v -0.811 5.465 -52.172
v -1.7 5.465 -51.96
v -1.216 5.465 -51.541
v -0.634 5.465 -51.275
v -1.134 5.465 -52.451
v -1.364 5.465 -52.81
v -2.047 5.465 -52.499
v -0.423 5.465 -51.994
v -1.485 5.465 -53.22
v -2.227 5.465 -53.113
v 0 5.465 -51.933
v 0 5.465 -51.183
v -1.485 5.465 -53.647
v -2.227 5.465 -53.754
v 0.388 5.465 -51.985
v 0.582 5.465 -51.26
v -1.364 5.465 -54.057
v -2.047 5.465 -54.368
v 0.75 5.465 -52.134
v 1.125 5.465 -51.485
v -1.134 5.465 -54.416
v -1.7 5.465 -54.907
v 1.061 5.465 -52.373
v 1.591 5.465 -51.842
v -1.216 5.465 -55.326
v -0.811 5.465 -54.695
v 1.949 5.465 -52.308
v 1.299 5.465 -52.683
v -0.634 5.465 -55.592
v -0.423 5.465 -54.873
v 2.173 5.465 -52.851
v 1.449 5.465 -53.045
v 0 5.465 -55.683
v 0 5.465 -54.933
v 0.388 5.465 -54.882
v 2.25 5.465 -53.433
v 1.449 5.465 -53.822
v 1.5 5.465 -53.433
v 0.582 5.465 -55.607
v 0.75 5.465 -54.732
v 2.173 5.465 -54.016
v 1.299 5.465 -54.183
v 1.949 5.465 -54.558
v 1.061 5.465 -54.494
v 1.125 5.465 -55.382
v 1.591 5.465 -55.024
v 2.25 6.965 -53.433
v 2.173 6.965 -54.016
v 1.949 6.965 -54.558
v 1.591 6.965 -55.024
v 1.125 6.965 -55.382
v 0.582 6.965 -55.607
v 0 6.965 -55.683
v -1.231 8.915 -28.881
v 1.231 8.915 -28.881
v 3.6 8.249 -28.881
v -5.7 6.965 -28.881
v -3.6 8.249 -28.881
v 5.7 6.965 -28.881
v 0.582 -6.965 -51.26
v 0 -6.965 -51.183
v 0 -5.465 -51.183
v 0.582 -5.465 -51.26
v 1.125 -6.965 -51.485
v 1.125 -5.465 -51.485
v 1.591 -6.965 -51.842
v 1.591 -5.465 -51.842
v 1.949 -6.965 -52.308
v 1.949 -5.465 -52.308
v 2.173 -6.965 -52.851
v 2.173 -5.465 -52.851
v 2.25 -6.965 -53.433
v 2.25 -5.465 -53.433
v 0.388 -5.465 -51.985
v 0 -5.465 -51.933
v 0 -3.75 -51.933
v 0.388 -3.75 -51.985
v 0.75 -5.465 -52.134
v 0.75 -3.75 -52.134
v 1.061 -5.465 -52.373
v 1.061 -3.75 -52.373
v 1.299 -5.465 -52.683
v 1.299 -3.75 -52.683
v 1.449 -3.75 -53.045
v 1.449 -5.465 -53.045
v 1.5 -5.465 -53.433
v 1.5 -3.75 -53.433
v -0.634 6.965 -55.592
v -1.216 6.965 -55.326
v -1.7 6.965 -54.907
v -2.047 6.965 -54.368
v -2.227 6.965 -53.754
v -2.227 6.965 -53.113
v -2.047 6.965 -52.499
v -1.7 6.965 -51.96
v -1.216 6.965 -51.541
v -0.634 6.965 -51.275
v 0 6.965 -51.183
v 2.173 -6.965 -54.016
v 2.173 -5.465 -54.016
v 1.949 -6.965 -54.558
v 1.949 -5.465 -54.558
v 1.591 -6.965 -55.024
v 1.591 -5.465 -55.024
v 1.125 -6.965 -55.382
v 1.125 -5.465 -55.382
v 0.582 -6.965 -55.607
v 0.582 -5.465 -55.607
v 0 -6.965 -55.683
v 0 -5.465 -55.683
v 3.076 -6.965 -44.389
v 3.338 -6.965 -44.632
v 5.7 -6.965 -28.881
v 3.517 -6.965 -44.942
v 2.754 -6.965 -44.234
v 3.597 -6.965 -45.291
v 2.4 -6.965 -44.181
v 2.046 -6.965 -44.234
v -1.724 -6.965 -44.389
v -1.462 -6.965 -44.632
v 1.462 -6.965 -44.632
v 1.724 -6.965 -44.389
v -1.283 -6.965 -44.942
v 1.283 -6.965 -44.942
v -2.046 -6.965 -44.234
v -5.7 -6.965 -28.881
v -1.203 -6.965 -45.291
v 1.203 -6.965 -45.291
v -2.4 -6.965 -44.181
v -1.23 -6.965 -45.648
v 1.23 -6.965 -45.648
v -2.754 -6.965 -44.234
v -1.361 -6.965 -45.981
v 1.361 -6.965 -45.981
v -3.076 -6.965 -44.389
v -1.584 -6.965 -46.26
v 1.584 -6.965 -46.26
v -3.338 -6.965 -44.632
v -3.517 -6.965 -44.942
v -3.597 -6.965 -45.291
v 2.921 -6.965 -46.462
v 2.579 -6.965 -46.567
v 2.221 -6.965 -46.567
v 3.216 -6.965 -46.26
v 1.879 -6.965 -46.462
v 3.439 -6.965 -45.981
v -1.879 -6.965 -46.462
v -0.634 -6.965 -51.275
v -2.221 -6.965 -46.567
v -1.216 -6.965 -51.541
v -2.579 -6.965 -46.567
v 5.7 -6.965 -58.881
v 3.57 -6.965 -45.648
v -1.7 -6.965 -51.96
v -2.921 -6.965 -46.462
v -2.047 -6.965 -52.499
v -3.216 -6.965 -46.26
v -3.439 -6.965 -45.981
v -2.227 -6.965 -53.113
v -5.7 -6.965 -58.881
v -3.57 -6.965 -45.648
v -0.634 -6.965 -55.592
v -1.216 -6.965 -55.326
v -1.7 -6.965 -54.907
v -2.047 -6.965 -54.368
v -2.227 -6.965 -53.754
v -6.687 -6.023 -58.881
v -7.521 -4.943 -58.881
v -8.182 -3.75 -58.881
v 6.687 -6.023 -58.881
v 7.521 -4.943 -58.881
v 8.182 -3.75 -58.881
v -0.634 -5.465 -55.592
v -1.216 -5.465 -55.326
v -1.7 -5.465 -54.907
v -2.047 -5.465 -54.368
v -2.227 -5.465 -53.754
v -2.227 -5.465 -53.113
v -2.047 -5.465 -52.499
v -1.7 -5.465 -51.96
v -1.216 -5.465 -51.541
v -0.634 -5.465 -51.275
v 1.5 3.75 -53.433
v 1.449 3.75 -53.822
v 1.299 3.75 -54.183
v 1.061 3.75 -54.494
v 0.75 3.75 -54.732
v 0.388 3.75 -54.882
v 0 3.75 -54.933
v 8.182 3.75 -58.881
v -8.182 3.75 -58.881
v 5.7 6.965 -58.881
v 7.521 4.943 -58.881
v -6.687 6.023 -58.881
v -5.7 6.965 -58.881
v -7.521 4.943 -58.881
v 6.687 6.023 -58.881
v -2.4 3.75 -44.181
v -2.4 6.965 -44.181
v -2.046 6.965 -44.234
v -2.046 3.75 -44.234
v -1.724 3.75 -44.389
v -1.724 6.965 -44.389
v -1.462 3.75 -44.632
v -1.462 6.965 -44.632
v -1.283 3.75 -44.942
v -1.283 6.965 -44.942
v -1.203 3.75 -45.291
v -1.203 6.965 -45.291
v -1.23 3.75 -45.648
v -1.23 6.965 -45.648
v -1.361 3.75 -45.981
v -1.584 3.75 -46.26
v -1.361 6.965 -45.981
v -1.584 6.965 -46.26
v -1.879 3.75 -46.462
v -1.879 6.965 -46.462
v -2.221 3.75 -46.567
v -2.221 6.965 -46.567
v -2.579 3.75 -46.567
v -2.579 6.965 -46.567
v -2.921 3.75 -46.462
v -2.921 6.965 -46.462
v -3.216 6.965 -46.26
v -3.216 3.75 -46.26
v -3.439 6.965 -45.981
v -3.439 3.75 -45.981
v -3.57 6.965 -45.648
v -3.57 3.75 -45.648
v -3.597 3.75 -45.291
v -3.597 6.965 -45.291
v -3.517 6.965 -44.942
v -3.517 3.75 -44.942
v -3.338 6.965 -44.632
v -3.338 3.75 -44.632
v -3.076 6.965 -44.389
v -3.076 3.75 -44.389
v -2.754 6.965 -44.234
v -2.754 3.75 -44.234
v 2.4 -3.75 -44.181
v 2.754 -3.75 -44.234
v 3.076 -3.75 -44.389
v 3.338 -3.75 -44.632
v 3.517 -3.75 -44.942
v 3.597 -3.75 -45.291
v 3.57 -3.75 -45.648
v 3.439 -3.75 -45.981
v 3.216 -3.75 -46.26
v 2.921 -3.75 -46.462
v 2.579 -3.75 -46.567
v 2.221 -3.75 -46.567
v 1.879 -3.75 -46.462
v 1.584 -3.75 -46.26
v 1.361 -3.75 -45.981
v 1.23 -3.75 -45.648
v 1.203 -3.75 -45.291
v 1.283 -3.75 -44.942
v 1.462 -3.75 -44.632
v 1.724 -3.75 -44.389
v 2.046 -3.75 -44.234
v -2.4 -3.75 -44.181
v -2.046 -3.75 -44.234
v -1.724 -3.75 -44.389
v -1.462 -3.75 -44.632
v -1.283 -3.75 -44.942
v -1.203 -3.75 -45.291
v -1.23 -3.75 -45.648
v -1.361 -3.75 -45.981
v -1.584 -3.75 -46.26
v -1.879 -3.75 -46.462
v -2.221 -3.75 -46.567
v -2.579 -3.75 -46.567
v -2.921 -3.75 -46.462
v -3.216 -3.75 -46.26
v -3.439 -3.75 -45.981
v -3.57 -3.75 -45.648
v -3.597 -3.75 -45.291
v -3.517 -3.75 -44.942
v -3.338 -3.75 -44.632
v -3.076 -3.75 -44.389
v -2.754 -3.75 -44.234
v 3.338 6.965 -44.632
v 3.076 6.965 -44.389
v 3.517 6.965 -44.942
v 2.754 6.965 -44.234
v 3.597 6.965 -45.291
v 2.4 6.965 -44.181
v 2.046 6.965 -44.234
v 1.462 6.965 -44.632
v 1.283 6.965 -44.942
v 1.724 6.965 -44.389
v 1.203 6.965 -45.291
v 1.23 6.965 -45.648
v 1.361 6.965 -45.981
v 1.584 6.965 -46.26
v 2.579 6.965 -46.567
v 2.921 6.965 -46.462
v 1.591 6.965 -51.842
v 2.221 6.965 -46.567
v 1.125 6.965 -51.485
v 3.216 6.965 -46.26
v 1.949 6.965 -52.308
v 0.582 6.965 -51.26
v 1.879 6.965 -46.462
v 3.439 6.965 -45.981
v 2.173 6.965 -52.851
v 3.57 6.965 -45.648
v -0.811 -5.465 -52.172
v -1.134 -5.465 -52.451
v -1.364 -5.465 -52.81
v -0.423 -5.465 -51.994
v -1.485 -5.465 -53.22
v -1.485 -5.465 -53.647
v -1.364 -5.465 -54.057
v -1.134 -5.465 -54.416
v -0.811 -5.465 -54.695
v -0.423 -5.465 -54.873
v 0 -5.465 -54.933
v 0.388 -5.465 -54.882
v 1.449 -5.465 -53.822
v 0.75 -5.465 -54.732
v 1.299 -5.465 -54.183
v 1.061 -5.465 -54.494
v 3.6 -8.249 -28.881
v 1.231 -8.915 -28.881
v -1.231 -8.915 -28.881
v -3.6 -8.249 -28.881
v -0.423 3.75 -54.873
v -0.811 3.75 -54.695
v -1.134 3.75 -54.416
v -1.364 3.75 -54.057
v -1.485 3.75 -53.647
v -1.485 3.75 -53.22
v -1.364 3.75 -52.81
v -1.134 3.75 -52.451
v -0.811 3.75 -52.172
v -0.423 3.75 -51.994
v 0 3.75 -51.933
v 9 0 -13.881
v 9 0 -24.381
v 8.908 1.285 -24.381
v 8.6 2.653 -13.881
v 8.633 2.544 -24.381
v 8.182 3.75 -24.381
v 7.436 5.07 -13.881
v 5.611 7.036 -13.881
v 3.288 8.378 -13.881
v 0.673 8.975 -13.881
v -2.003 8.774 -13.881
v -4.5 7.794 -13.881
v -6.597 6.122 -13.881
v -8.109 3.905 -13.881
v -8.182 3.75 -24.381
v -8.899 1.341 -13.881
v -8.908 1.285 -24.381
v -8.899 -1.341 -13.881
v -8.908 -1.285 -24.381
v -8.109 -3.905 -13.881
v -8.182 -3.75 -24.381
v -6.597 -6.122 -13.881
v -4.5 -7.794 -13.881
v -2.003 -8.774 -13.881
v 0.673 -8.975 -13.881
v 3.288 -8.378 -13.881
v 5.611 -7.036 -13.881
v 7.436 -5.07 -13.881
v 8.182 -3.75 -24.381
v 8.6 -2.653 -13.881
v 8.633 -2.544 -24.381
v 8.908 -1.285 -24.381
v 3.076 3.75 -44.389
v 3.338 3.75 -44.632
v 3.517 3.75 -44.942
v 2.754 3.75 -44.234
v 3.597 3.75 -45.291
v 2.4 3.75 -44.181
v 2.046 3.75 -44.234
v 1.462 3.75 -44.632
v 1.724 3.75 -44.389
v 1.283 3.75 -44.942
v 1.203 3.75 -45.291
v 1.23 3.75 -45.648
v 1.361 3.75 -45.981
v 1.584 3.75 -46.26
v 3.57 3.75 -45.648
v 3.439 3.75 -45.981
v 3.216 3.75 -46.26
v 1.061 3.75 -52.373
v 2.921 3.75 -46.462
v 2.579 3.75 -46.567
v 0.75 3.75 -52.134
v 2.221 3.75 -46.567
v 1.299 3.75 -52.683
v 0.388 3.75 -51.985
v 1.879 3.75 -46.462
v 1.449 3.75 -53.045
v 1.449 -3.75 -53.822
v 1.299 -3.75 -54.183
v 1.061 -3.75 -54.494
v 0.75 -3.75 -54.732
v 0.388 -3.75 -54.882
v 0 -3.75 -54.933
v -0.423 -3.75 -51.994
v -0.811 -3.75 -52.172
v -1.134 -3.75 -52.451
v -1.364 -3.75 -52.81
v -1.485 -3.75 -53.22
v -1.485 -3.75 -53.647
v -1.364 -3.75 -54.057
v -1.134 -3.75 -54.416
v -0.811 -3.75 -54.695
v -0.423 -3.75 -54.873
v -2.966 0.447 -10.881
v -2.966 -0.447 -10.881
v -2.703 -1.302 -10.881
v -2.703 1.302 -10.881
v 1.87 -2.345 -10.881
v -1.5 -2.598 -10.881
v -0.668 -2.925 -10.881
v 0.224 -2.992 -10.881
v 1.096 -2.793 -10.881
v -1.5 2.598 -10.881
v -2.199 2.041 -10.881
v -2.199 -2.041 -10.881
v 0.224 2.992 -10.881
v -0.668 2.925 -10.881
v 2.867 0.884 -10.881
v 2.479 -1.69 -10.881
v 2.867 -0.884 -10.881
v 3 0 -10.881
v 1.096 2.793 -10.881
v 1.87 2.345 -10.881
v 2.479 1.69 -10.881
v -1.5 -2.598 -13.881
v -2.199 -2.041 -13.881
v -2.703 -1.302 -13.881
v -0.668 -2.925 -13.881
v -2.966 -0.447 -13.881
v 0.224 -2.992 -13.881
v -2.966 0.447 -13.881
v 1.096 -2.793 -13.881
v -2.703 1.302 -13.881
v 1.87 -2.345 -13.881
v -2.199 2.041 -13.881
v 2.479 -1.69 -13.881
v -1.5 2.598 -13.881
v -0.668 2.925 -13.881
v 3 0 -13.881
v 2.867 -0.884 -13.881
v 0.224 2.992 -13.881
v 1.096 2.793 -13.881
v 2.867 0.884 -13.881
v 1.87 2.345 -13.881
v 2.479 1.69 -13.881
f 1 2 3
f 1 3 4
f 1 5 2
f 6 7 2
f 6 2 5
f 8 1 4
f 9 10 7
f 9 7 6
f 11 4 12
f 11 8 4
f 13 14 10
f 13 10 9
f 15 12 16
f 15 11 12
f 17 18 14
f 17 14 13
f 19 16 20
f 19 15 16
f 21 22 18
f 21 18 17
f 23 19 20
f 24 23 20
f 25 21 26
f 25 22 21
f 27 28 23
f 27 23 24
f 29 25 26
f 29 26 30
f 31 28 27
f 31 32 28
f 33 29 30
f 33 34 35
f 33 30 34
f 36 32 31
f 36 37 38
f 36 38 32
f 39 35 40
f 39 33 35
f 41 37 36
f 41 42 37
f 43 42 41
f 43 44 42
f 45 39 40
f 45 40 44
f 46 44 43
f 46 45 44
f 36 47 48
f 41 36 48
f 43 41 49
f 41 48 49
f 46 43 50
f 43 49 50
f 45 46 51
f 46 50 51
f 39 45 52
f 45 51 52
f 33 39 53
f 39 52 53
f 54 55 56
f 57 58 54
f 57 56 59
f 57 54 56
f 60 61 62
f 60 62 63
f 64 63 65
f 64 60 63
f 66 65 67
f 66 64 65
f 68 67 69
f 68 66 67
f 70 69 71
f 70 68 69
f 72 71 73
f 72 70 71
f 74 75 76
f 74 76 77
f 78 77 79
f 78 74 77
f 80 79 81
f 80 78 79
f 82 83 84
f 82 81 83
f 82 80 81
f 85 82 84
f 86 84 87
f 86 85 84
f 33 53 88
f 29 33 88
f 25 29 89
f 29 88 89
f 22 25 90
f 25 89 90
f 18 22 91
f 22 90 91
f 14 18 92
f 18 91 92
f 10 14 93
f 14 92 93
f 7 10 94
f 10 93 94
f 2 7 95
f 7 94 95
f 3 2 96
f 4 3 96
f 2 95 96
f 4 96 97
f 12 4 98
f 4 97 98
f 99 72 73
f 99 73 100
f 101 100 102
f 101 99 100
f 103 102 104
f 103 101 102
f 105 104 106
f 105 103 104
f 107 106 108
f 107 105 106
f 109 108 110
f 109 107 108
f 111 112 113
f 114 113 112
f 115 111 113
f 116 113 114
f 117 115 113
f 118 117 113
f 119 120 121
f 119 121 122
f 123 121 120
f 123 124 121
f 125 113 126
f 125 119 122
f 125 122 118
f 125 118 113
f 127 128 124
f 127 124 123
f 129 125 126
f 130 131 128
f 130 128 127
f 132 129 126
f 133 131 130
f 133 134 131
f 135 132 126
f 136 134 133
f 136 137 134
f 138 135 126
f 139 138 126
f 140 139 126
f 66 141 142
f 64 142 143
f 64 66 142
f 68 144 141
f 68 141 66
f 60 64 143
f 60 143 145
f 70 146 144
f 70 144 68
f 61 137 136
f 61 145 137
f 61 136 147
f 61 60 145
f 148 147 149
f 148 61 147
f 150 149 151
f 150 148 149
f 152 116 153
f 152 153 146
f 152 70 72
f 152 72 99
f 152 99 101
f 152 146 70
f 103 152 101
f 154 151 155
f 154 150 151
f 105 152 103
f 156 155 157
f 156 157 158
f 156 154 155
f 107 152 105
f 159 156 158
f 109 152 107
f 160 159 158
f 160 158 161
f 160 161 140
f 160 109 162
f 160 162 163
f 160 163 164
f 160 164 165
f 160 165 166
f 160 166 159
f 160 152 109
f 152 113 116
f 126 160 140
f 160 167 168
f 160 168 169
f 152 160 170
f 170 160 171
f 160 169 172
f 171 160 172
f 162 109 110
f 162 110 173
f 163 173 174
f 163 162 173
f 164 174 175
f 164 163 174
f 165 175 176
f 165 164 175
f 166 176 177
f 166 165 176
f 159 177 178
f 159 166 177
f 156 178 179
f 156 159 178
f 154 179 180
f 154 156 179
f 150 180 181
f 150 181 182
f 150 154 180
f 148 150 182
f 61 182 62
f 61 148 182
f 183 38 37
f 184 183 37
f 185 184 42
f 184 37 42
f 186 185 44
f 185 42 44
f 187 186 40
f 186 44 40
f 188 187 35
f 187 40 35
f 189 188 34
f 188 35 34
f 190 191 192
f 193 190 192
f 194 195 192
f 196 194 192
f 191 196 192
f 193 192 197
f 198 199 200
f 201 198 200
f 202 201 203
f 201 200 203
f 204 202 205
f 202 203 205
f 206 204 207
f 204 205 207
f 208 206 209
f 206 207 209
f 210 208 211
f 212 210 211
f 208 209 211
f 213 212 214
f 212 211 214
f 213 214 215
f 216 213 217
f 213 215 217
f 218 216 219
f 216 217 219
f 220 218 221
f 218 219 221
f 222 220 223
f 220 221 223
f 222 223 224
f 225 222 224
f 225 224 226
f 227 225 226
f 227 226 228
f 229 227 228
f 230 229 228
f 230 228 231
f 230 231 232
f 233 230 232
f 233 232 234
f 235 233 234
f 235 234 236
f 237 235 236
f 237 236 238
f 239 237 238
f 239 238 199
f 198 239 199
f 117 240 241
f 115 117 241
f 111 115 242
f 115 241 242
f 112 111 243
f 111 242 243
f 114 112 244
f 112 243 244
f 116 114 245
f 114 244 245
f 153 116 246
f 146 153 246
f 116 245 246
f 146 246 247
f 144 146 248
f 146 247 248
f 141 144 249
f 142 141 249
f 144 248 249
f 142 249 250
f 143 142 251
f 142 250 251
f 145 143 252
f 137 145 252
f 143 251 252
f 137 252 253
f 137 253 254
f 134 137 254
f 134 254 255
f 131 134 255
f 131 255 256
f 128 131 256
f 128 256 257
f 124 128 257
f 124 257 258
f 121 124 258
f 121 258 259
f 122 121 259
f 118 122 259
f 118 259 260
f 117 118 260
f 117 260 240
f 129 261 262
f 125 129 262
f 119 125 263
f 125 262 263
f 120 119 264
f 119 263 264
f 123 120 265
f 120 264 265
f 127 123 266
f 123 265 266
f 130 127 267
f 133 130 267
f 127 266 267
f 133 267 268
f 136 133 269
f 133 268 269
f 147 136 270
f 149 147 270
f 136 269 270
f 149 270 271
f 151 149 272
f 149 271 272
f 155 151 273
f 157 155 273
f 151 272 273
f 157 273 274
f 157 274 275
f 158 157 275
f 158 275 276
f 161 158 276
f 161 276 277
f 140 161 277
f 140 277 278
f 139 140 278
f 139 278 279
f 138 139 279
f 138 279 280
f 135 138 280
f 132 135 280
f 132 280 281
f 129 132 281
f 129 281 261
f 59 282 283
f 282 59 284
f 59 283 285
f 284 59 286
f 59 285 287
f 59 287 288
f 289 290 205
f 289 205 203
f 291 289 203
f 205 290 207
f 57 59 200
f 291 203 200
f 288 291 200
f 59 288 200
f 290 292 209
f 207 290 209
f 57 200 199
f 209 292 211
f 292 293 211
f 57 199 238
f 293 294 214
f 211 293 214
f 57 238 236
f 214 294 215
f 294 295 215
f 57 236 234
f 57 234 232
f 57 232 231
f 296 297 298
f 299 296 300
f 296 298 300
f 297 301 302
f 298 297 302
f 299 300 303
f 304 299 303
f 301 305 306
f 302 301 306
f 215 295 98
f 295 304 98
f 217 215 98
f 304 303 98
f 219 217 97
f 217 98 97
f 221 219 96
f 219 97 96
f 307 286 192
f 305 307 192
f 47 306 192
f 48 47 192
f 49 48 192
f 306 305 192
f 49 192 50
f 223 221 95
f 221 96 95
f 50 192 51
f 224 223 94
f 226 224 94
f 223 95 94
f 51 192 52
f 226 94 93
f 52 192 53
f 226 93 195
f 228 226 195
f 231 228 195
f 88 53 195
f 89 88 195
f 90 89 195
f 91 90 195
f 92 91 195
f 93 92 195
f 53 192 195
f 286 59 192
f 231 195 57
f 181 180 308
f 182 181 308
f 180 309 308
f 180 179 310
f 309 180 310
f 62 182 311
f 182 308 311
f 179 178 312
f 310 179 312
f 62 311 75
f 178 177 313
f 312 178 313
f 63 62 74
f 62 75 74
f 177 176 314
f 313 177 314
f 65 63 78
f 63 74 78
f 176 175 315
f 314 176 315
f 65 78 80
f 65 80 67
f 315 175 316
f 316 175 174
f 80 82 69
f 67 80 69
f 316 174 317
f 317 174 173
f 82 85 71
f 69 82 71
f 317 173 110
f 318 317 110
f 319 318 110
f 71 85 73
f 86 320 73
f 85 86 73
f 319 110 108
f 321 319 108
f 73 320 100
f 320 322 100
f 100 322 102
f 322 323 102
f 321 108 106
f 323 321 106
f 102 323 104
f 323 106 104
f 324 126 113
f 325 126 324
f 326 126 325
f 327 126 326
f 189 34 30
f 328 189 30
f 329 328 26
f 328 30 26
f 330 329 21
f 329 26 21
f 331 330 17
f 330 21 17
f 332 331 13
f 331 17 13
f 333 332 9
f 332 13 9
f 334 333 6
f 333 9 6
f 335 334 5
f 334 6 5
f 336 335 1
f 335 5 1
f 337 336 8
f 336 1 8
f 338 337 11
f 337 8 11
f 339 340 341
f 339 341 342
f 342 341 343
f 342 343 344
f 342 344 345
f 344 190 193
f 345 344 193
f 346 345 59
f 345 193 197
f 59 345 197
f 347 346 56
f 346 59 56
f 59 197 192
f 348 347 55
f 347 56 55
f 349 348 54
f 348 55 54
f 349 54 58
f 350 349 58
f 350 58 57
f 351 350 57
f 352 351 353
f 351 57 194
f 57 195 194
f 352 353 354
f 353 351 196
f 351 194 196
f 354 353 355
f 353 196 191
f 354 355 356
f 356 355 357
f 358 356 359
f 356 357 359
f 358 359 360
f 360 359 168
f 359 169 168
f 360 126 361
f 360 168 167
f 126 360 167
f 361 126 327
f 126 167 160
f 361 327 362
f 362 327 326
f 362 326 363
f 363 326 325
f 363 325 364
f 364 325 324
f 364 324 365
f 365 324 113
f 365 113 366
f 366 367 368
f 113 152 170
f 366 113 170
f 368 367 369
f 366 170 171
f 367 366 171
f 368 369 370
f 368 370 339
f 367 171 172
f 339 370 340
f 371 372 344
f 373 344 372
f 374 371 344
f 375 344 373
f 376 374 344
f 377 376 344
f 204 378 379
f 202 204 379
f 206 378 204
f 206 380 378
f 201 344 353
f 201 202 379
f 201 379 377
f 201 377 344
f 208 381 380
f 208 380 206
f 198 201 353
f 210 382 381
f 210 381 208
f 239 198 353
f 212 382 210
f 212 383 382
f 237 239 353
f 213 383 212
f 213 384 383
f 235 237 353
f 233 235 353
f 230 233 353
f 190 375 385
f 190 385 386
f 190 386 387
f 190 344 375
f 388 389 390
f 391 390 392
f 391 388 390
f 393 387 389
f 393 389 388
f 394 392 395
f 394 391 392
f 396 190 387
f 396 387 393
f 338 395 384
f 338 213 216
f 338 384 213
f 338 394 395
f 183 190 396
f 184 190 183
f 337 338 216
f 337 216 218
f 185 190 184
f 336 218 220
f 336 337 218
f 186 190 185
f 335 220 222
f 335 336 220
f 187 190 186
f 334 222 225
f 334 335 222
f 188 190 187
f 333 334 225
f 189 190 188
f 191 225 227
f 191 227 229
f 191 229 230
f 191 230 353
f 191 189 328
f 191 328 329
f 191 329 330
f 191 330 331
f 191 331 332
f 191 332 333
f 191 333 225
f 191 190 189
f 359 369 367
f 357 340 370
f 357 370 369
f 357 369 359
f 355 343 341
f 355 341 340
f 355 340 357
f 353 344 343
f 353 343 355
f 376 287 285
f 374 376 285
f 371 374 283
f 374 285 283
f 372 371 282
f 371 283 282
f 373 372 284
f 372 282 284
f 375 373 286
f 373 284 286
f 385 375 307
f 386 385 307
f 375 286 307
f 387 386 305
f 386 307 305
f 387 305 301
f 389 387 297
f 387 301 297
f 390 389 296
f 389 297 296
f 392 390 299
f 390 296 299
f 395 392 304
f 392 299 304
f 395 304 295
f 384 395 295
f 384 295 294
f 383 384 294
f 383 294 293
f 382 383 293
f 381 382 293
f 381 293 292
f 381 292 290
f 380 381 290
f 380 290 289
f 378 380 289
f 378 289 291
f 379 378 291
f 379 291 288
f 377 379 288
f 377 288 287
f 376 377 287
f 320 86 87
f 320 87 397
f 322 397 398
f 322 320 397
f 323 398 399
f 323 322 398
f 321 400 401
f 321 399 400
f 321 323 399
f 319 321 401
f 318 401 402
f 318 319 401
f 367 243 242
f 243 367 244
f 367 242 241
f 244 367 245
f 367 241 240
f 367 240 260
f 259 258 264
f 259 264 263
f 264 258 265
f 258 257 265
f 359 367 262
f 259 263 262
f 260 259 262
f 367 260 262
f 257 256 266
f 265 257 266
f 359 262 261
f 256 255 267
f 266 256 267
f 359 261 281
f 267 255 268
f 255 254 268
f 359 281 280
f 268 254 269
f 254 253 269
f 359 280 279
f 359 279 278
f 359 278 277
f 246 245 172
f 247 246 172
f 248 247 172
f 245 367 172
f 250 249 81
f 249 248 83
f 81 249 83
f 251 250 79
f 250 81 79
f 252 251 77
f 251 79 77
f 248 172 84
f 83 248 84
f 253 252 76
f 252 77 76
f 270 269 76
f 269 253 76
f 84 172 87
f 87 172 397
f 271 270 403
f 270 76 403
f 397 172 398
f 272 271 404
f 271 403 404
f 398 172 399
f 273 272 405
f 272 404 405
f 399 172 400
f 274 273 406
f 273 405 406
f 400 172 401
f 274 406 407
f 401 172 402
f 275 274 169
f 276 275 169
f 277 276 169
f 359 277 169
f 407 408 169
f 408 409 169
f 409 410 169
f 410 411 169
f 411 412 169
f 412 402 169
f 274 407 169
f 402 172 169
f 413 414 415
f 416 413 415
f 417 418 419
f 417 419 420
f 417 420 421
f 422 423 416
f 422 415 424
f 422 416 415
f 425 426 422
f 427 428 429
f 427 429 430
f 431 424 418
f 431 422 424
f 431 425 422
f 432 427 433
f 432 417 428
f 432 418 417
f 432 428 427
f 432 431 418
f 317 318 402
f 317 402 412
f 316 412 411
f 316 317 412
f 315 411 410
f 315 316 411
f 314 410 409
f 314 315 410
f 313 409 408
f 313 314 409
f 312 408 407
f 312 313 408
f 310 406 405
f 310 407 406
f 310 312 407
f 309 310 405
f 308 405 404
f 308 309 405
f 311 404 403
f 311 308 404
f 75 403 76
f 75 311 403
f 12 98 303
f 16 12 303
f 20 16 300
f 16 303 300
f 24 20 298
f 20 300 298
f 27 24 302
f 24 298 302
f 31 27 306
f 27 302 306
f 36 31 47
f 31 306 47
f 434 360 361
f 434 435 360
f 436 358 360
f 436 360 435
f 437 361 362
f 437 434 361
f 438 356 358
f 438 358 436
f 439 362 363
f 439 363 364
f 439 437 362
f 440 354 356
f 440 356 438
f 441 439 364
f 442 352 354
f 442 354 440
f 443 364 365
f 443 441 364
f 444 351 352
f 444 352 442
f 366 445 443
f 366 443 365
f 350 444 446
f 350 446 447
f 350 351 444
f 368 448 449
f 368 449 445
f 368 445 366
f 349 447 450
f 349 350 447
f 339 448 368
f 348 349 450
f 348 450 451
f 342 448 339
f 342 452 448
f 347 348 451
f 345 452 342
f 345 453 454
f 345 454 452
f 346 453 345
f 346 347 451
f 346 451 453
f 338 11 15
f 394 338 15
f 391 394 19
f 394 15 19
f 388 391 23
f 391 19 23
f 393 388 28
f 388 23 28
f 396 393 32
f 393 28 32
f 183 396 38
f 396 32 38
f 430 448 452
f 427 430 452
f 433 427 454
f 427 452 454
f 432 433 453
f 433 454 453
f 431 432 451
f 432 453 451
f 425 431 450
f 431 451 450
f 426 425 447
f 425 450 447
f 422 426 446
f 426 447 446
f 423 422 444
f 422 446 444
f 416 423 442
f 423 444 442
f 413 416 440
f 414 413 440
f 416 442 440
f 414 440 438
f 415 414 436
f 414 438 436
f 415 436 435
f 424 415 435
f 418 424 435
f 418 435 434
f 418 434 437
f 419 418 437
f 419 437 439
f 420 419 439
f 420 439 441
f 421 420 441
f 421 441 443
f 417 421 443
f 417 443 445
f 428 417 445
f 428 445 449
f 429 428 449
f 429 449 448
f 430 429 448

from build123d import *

# Parameters (mm, degrees)
IZIM1_R                     = 30
IZIM1_R_2                   = 10
Y_KSEKLIK_EKSTR_ZYON2_DEPTH = 25
IZIM1_4_R                   = 10
Y_KSEKLIK_EKSTR_ZYON3_DEPTH = 35
Y_KSEKLIK_EKSTR_ZYON4_START = -125
IZIM1_5_R                   = 30
IZIM1_5_R_2                 = 10
Y_KSEKLIK_EKSTR_ZYON4_DEPTH = 125
IZIM3_W                     = 54.543560574
IZIM3_H                     = 25
KES_EKSTR_ZYON1_DEPTH       = 115
KES_EKSTR_ZYON2_DEPTH       = 100
IZIM5_R                     = 4
KES_EKSTR_ZYON3_DEPTH       = 100
KES_EKSTR_ZYON4_DEPTH       = 5
KES_EKSTR_ZYON5_DEPTH       = 35.716373532
L_EK1_SCALE                 = 0.3


with BuildPart() as part:
    # Çizim1 → Yükseklik-Ekstrüzyon2 (new body)
    # profile 1 of 2: a face of its own
    with BuildSketch(Plane.XY):
        Circle(IZIM1_R)
        Circle(IZIM1_R_2, mode=Mode.SUBTRACT)
    # profile 2 of 2: a face of its own
    with BuildSketch(Plane.XY):
        Circle(IZIM1_R_2)
    extrude(amount=Y_KSEKLIK_EKSTR_ZYON2_DEPTH)

    # Çizim1<4> → Yükseklik-Ekstrüzyon3 (add)
    with BuildSketch(Plane.XY):
        Circle(IZIM1_4_R)
    extrude(amount=Y_KSEKLIK_EKSTR_ZYON3_DEPTH)

    # Çizim1<5> → Yükseklik-Ekstrüzyon4 (add)
    # profile 1 of 2: a face of its own
    with BuildSketch(Plane.XY.offset(Y_KSEKLIK_EKSTR_ZYON4_START)):
        Circle(IZIM1_5_R)
        Circle(IZIM1_5_R_2, mode=Mode.SUBTRACT)
    # profile 2 of 2: a face of its own
    with BuildSketch(Plane.XY.offset(Y_KSEKLIK_EKSTR_ZYON4_START)):
        Circle(IZIM1_5_R_2)
    extrude(amount=Y_KSEKLIK_EKSTR_ZYON4_DEPTH)

    # Çizim3 → Kes-Ekstrüzyon1 (cut)
    with BuildSketch(Plane(origin=(0, 0, -125), x_dir=(-1, 0, 0), z_dir=(0, 0, -1))):
        Rectangle(IZIM3_W, IZIM3_H)
        with BuildLine():
            Line((-27.271780287, -12.5), (-27.271780287, 12.5))
            ThreePointArc((-27.271780287, 12.5), (-30, 0), (-27.271780287, -12.5))
        make_face()
        with BuildLine():
            ThreePointArc((27.271780287, -12.5), (30, 0), (27.271780287, 12.5))
            Line((27.271780287, 12.5), (27.271780287, -12.5))
        make_face()
    extrude(amount=-KES_EKSTR_ZYON1_DEPTH, mode=Mode.SUBTRACT)

    # Çizim4 → Kes-Ekstrüzyon2 (cut)
    with BuildSketch(Plane(origin=(0, 0, -125), x_dir=(-1, 0, 0), z_dir=(0, 0, -1))):
        with BuildLine():
            Line((-19, 23.216373532), (19, 23.216373532))
            ThreePointArc((19, 23.216373532), (0, 30), (-19, 23.216373532))
        make_face()
        with BuildLine():
            Line((-19, -23.216373532), (19, -23.216373532))
            ThreePointArc((19, -23.216373532), (0, -30), (-19, -23.216373532))
        make_face()
    extrude(amount=-KES_EKSTR_ZYON2_DEPTH, mode=Mode.SUBTRACT)

    # Çizim5 → Kes-Ekstrüzyon3 (cut)
    with BuildSketch(Plane(origin=(0, 23.216373532, 0), x_dir=(1, 0, 0), z_dir=(0, 1, 0))):
        with Locations(Location((-8, 80, 0), (0, 0, 270))):
            Circle(IZIM5_R)
        with Locations(Location((8, 80, 0), (0, 0, 270))):
            Circle(IZIM5_R)
    extrude(amount=-KES_EKSTR_ZYON3_DEPTH, mode=Mode.SUBTRACT)

    # Çizim6 → Kes-Ekstrüzyon4 (cut)
    with BuildSketch(Plane(origin=(0, 23.216373532, 0), x_dir=(1, 0, 0), z_dir=(0, 1, 0))):
        with BuildLine():
            ThreePointArc((5, 106.843021333), (3.535533906, 110.378555239), (0, 111.843021333))
            Line((0, 111.843021333), (0, 101.843021333))
            ThreePointArc((0, 101.843021333), (3.535533906, 103.307487427), (5, 106.843021333))
        make_face()
        with BuildLine():
            Line((0, 101.843021333), (0, 111.843021333))
            ThreePointArc((0, 111.843021333), (-5, 106.843021333), (0, 101.843021333))
        make_face()
        with BuildLine():
            ThreePointArc((7.5, 106.843021333), (5.303300859, 112.146322192), (0, 114.343021333))
            Line((0, 114.343021333), (0, 111.843021333))
            ThreePointArc((0, 111.843021333), (3.535533906, 110.378555239), (5, 106.843021333))
            ThreePointArc((5, 106.843021333), (3.535533906, 103.307487427), (0, 101.843021333))
            Line((0, 101.843021333), (0, 99.343021333))
            ThreePointArc((0, 99.343021333), (5.303300859, 101.539720474), (7.5, 106.843021333))
        make_face()
        with BuildLine():
            Line((0, 111.843021333), (0, 114.343021333))
            ThreePointArc((0, 114.343021333), (-7.5, 106.843021333), (0, 99.343021333))
            Line((0, 99.343021333), (0, 101.843021333))
            ThreePointArc((0, 101.843021333), (-5, 106.843021333), (0, 111.843021333))
        make_face()
    kes_ekstr_zyon4 = extrude(amount=-KES_EKSTR_ZYON4_DEPTH, mode=Mode.SUBTRACT)

    # Çizim6<3> → Kes-Ekstrüzyon5 (cut)
    with BuildSketch(Plane(origin=(0, 23.216373532, 0), x_dir=(1, 0, 0), z_dir=(0, 1, 0))):
        with BuildLine():
            ThreePointArc((5, 106.843021333), (3.535533906, 110.378555239), (0, 111.843021333))
            Line((0, 111.843021333), (0, 101.843021333))
            ThreePointArc((0, 101.843021333), (3.535533906, 103.307487427), (5, 106.843021333))
        make_face()
        with BuildLine():
            Line((0, 101.843021333), (0, 111.843021333))
            ThreePointArc((0, 111.843021333), (-5, 106.843021333), (0, 101.843021333))
        make_face()
    kes_ekstr_zyon5 = extrude(amount=-KES_EKSTR_ZYON5_DEPTH, mode=Mode.SUBTRACT)

    # Aynalama1: Kes-Ekstrüzyon4, Kes-Ekstrüzyon5 across plane
    add(kes_ekstr_zyon4.mirror(Plane.ZX), mode=Mode.SUBTRACT)
    add(kes_ekstr_zyon5.mirror(Plane.ZX), mode=Mode.SUBTRACT)


with BuildPart() as part_1:
    # Ölçek1: scaled about (0, 0, -30.54358769)
    add(part.part.scale(L_EK1_SCALE).moved(Location((0, 0, -21.380511383))))


solid = part_1.part
